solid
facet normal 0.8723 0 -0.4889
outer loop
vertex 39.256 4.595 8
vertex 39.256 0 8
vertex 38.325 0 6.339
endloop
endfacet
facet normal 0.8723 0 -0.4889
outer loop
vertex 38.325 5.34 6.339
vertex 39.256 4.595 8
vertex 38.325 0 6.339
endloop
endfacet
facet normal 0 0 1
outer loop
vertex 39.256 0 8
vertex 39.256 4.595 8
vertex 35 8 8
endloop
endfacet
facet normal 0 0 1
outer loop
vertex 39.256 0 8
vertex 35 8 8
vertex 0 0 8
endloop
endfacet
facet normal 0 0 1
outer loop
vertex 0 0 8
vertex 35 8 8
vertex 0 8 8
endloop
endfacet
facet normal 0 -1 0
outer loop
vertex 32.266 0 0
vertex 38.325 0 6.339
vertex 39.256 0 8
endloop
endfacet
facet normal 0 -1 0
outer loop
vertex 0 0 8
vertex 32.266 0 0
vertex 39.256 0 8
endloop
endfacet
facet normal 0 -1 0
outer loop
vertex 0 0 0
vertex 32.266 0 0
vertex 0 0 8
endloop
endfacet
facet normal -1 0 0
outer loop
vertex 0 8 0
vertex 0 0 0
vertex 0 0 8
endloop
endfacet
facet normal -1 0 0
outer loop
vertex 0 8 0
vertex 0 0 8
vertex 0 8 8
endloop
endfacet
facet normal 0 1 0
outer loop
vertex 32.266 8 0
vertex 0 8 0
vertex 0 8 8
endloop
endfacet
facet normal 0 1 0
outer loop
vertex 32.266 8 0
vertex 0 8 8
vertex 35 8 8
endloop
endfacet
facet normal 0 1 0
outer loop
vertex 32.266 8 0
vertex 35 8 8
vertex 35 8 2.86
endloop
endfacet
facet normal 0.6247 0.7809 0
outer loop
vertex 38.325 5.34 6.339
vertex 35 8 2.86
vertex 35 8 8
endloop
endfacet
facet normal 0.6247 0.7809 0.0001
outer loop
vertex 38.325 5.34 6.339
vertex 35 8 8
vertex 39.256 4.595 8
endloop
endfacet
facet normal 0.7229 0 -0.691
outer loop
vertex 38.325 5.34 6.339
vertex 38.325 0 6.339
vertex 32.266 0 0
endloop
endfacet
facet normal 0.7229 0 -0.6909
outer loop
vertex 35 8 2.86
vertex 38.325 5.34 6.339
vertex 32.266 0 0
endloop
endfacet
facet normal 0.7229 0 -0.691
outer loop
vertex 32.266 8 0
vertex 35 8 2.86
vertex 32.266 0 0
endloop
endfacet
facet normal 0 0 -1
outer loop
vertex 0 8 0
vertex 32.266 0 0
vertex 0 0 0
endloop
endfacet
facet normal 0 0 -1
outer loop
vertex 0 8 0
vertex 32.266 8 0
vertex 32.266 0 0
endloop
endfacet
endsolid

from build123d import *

# Parameters (mm, degrees)
EXTRUDE_1_DEPTH     = 8
CUT_EXTRUDE_1_DEPTH = 9


with BuildPart() as part:
    # Эскиз1 → Бобышка-Вытянуть1 (new body)
    with BuildSketch(Plane.XY):
        Polygon((0, 0), (0, 8), (35, 8), (39.256106995, 4.595114404), (39.256106995, 0), align=None)
    extrude(amount=EXTRUDE_1_DEPTH)

    # Эскиз2 → Вырез-Вытянуть1 (cut, through all)
    with BuildSketch(Plane.XZ):
        Polygon((32.26555928, 0), (39.256106995, 0), (39.256106995, 8), (38.325183504, 6.338802332), align=None)
    extrude(amount=-CUT_EXTRUDE_1_DEPTH, mode=Mode.SUBTRACT)


solid = part.part
